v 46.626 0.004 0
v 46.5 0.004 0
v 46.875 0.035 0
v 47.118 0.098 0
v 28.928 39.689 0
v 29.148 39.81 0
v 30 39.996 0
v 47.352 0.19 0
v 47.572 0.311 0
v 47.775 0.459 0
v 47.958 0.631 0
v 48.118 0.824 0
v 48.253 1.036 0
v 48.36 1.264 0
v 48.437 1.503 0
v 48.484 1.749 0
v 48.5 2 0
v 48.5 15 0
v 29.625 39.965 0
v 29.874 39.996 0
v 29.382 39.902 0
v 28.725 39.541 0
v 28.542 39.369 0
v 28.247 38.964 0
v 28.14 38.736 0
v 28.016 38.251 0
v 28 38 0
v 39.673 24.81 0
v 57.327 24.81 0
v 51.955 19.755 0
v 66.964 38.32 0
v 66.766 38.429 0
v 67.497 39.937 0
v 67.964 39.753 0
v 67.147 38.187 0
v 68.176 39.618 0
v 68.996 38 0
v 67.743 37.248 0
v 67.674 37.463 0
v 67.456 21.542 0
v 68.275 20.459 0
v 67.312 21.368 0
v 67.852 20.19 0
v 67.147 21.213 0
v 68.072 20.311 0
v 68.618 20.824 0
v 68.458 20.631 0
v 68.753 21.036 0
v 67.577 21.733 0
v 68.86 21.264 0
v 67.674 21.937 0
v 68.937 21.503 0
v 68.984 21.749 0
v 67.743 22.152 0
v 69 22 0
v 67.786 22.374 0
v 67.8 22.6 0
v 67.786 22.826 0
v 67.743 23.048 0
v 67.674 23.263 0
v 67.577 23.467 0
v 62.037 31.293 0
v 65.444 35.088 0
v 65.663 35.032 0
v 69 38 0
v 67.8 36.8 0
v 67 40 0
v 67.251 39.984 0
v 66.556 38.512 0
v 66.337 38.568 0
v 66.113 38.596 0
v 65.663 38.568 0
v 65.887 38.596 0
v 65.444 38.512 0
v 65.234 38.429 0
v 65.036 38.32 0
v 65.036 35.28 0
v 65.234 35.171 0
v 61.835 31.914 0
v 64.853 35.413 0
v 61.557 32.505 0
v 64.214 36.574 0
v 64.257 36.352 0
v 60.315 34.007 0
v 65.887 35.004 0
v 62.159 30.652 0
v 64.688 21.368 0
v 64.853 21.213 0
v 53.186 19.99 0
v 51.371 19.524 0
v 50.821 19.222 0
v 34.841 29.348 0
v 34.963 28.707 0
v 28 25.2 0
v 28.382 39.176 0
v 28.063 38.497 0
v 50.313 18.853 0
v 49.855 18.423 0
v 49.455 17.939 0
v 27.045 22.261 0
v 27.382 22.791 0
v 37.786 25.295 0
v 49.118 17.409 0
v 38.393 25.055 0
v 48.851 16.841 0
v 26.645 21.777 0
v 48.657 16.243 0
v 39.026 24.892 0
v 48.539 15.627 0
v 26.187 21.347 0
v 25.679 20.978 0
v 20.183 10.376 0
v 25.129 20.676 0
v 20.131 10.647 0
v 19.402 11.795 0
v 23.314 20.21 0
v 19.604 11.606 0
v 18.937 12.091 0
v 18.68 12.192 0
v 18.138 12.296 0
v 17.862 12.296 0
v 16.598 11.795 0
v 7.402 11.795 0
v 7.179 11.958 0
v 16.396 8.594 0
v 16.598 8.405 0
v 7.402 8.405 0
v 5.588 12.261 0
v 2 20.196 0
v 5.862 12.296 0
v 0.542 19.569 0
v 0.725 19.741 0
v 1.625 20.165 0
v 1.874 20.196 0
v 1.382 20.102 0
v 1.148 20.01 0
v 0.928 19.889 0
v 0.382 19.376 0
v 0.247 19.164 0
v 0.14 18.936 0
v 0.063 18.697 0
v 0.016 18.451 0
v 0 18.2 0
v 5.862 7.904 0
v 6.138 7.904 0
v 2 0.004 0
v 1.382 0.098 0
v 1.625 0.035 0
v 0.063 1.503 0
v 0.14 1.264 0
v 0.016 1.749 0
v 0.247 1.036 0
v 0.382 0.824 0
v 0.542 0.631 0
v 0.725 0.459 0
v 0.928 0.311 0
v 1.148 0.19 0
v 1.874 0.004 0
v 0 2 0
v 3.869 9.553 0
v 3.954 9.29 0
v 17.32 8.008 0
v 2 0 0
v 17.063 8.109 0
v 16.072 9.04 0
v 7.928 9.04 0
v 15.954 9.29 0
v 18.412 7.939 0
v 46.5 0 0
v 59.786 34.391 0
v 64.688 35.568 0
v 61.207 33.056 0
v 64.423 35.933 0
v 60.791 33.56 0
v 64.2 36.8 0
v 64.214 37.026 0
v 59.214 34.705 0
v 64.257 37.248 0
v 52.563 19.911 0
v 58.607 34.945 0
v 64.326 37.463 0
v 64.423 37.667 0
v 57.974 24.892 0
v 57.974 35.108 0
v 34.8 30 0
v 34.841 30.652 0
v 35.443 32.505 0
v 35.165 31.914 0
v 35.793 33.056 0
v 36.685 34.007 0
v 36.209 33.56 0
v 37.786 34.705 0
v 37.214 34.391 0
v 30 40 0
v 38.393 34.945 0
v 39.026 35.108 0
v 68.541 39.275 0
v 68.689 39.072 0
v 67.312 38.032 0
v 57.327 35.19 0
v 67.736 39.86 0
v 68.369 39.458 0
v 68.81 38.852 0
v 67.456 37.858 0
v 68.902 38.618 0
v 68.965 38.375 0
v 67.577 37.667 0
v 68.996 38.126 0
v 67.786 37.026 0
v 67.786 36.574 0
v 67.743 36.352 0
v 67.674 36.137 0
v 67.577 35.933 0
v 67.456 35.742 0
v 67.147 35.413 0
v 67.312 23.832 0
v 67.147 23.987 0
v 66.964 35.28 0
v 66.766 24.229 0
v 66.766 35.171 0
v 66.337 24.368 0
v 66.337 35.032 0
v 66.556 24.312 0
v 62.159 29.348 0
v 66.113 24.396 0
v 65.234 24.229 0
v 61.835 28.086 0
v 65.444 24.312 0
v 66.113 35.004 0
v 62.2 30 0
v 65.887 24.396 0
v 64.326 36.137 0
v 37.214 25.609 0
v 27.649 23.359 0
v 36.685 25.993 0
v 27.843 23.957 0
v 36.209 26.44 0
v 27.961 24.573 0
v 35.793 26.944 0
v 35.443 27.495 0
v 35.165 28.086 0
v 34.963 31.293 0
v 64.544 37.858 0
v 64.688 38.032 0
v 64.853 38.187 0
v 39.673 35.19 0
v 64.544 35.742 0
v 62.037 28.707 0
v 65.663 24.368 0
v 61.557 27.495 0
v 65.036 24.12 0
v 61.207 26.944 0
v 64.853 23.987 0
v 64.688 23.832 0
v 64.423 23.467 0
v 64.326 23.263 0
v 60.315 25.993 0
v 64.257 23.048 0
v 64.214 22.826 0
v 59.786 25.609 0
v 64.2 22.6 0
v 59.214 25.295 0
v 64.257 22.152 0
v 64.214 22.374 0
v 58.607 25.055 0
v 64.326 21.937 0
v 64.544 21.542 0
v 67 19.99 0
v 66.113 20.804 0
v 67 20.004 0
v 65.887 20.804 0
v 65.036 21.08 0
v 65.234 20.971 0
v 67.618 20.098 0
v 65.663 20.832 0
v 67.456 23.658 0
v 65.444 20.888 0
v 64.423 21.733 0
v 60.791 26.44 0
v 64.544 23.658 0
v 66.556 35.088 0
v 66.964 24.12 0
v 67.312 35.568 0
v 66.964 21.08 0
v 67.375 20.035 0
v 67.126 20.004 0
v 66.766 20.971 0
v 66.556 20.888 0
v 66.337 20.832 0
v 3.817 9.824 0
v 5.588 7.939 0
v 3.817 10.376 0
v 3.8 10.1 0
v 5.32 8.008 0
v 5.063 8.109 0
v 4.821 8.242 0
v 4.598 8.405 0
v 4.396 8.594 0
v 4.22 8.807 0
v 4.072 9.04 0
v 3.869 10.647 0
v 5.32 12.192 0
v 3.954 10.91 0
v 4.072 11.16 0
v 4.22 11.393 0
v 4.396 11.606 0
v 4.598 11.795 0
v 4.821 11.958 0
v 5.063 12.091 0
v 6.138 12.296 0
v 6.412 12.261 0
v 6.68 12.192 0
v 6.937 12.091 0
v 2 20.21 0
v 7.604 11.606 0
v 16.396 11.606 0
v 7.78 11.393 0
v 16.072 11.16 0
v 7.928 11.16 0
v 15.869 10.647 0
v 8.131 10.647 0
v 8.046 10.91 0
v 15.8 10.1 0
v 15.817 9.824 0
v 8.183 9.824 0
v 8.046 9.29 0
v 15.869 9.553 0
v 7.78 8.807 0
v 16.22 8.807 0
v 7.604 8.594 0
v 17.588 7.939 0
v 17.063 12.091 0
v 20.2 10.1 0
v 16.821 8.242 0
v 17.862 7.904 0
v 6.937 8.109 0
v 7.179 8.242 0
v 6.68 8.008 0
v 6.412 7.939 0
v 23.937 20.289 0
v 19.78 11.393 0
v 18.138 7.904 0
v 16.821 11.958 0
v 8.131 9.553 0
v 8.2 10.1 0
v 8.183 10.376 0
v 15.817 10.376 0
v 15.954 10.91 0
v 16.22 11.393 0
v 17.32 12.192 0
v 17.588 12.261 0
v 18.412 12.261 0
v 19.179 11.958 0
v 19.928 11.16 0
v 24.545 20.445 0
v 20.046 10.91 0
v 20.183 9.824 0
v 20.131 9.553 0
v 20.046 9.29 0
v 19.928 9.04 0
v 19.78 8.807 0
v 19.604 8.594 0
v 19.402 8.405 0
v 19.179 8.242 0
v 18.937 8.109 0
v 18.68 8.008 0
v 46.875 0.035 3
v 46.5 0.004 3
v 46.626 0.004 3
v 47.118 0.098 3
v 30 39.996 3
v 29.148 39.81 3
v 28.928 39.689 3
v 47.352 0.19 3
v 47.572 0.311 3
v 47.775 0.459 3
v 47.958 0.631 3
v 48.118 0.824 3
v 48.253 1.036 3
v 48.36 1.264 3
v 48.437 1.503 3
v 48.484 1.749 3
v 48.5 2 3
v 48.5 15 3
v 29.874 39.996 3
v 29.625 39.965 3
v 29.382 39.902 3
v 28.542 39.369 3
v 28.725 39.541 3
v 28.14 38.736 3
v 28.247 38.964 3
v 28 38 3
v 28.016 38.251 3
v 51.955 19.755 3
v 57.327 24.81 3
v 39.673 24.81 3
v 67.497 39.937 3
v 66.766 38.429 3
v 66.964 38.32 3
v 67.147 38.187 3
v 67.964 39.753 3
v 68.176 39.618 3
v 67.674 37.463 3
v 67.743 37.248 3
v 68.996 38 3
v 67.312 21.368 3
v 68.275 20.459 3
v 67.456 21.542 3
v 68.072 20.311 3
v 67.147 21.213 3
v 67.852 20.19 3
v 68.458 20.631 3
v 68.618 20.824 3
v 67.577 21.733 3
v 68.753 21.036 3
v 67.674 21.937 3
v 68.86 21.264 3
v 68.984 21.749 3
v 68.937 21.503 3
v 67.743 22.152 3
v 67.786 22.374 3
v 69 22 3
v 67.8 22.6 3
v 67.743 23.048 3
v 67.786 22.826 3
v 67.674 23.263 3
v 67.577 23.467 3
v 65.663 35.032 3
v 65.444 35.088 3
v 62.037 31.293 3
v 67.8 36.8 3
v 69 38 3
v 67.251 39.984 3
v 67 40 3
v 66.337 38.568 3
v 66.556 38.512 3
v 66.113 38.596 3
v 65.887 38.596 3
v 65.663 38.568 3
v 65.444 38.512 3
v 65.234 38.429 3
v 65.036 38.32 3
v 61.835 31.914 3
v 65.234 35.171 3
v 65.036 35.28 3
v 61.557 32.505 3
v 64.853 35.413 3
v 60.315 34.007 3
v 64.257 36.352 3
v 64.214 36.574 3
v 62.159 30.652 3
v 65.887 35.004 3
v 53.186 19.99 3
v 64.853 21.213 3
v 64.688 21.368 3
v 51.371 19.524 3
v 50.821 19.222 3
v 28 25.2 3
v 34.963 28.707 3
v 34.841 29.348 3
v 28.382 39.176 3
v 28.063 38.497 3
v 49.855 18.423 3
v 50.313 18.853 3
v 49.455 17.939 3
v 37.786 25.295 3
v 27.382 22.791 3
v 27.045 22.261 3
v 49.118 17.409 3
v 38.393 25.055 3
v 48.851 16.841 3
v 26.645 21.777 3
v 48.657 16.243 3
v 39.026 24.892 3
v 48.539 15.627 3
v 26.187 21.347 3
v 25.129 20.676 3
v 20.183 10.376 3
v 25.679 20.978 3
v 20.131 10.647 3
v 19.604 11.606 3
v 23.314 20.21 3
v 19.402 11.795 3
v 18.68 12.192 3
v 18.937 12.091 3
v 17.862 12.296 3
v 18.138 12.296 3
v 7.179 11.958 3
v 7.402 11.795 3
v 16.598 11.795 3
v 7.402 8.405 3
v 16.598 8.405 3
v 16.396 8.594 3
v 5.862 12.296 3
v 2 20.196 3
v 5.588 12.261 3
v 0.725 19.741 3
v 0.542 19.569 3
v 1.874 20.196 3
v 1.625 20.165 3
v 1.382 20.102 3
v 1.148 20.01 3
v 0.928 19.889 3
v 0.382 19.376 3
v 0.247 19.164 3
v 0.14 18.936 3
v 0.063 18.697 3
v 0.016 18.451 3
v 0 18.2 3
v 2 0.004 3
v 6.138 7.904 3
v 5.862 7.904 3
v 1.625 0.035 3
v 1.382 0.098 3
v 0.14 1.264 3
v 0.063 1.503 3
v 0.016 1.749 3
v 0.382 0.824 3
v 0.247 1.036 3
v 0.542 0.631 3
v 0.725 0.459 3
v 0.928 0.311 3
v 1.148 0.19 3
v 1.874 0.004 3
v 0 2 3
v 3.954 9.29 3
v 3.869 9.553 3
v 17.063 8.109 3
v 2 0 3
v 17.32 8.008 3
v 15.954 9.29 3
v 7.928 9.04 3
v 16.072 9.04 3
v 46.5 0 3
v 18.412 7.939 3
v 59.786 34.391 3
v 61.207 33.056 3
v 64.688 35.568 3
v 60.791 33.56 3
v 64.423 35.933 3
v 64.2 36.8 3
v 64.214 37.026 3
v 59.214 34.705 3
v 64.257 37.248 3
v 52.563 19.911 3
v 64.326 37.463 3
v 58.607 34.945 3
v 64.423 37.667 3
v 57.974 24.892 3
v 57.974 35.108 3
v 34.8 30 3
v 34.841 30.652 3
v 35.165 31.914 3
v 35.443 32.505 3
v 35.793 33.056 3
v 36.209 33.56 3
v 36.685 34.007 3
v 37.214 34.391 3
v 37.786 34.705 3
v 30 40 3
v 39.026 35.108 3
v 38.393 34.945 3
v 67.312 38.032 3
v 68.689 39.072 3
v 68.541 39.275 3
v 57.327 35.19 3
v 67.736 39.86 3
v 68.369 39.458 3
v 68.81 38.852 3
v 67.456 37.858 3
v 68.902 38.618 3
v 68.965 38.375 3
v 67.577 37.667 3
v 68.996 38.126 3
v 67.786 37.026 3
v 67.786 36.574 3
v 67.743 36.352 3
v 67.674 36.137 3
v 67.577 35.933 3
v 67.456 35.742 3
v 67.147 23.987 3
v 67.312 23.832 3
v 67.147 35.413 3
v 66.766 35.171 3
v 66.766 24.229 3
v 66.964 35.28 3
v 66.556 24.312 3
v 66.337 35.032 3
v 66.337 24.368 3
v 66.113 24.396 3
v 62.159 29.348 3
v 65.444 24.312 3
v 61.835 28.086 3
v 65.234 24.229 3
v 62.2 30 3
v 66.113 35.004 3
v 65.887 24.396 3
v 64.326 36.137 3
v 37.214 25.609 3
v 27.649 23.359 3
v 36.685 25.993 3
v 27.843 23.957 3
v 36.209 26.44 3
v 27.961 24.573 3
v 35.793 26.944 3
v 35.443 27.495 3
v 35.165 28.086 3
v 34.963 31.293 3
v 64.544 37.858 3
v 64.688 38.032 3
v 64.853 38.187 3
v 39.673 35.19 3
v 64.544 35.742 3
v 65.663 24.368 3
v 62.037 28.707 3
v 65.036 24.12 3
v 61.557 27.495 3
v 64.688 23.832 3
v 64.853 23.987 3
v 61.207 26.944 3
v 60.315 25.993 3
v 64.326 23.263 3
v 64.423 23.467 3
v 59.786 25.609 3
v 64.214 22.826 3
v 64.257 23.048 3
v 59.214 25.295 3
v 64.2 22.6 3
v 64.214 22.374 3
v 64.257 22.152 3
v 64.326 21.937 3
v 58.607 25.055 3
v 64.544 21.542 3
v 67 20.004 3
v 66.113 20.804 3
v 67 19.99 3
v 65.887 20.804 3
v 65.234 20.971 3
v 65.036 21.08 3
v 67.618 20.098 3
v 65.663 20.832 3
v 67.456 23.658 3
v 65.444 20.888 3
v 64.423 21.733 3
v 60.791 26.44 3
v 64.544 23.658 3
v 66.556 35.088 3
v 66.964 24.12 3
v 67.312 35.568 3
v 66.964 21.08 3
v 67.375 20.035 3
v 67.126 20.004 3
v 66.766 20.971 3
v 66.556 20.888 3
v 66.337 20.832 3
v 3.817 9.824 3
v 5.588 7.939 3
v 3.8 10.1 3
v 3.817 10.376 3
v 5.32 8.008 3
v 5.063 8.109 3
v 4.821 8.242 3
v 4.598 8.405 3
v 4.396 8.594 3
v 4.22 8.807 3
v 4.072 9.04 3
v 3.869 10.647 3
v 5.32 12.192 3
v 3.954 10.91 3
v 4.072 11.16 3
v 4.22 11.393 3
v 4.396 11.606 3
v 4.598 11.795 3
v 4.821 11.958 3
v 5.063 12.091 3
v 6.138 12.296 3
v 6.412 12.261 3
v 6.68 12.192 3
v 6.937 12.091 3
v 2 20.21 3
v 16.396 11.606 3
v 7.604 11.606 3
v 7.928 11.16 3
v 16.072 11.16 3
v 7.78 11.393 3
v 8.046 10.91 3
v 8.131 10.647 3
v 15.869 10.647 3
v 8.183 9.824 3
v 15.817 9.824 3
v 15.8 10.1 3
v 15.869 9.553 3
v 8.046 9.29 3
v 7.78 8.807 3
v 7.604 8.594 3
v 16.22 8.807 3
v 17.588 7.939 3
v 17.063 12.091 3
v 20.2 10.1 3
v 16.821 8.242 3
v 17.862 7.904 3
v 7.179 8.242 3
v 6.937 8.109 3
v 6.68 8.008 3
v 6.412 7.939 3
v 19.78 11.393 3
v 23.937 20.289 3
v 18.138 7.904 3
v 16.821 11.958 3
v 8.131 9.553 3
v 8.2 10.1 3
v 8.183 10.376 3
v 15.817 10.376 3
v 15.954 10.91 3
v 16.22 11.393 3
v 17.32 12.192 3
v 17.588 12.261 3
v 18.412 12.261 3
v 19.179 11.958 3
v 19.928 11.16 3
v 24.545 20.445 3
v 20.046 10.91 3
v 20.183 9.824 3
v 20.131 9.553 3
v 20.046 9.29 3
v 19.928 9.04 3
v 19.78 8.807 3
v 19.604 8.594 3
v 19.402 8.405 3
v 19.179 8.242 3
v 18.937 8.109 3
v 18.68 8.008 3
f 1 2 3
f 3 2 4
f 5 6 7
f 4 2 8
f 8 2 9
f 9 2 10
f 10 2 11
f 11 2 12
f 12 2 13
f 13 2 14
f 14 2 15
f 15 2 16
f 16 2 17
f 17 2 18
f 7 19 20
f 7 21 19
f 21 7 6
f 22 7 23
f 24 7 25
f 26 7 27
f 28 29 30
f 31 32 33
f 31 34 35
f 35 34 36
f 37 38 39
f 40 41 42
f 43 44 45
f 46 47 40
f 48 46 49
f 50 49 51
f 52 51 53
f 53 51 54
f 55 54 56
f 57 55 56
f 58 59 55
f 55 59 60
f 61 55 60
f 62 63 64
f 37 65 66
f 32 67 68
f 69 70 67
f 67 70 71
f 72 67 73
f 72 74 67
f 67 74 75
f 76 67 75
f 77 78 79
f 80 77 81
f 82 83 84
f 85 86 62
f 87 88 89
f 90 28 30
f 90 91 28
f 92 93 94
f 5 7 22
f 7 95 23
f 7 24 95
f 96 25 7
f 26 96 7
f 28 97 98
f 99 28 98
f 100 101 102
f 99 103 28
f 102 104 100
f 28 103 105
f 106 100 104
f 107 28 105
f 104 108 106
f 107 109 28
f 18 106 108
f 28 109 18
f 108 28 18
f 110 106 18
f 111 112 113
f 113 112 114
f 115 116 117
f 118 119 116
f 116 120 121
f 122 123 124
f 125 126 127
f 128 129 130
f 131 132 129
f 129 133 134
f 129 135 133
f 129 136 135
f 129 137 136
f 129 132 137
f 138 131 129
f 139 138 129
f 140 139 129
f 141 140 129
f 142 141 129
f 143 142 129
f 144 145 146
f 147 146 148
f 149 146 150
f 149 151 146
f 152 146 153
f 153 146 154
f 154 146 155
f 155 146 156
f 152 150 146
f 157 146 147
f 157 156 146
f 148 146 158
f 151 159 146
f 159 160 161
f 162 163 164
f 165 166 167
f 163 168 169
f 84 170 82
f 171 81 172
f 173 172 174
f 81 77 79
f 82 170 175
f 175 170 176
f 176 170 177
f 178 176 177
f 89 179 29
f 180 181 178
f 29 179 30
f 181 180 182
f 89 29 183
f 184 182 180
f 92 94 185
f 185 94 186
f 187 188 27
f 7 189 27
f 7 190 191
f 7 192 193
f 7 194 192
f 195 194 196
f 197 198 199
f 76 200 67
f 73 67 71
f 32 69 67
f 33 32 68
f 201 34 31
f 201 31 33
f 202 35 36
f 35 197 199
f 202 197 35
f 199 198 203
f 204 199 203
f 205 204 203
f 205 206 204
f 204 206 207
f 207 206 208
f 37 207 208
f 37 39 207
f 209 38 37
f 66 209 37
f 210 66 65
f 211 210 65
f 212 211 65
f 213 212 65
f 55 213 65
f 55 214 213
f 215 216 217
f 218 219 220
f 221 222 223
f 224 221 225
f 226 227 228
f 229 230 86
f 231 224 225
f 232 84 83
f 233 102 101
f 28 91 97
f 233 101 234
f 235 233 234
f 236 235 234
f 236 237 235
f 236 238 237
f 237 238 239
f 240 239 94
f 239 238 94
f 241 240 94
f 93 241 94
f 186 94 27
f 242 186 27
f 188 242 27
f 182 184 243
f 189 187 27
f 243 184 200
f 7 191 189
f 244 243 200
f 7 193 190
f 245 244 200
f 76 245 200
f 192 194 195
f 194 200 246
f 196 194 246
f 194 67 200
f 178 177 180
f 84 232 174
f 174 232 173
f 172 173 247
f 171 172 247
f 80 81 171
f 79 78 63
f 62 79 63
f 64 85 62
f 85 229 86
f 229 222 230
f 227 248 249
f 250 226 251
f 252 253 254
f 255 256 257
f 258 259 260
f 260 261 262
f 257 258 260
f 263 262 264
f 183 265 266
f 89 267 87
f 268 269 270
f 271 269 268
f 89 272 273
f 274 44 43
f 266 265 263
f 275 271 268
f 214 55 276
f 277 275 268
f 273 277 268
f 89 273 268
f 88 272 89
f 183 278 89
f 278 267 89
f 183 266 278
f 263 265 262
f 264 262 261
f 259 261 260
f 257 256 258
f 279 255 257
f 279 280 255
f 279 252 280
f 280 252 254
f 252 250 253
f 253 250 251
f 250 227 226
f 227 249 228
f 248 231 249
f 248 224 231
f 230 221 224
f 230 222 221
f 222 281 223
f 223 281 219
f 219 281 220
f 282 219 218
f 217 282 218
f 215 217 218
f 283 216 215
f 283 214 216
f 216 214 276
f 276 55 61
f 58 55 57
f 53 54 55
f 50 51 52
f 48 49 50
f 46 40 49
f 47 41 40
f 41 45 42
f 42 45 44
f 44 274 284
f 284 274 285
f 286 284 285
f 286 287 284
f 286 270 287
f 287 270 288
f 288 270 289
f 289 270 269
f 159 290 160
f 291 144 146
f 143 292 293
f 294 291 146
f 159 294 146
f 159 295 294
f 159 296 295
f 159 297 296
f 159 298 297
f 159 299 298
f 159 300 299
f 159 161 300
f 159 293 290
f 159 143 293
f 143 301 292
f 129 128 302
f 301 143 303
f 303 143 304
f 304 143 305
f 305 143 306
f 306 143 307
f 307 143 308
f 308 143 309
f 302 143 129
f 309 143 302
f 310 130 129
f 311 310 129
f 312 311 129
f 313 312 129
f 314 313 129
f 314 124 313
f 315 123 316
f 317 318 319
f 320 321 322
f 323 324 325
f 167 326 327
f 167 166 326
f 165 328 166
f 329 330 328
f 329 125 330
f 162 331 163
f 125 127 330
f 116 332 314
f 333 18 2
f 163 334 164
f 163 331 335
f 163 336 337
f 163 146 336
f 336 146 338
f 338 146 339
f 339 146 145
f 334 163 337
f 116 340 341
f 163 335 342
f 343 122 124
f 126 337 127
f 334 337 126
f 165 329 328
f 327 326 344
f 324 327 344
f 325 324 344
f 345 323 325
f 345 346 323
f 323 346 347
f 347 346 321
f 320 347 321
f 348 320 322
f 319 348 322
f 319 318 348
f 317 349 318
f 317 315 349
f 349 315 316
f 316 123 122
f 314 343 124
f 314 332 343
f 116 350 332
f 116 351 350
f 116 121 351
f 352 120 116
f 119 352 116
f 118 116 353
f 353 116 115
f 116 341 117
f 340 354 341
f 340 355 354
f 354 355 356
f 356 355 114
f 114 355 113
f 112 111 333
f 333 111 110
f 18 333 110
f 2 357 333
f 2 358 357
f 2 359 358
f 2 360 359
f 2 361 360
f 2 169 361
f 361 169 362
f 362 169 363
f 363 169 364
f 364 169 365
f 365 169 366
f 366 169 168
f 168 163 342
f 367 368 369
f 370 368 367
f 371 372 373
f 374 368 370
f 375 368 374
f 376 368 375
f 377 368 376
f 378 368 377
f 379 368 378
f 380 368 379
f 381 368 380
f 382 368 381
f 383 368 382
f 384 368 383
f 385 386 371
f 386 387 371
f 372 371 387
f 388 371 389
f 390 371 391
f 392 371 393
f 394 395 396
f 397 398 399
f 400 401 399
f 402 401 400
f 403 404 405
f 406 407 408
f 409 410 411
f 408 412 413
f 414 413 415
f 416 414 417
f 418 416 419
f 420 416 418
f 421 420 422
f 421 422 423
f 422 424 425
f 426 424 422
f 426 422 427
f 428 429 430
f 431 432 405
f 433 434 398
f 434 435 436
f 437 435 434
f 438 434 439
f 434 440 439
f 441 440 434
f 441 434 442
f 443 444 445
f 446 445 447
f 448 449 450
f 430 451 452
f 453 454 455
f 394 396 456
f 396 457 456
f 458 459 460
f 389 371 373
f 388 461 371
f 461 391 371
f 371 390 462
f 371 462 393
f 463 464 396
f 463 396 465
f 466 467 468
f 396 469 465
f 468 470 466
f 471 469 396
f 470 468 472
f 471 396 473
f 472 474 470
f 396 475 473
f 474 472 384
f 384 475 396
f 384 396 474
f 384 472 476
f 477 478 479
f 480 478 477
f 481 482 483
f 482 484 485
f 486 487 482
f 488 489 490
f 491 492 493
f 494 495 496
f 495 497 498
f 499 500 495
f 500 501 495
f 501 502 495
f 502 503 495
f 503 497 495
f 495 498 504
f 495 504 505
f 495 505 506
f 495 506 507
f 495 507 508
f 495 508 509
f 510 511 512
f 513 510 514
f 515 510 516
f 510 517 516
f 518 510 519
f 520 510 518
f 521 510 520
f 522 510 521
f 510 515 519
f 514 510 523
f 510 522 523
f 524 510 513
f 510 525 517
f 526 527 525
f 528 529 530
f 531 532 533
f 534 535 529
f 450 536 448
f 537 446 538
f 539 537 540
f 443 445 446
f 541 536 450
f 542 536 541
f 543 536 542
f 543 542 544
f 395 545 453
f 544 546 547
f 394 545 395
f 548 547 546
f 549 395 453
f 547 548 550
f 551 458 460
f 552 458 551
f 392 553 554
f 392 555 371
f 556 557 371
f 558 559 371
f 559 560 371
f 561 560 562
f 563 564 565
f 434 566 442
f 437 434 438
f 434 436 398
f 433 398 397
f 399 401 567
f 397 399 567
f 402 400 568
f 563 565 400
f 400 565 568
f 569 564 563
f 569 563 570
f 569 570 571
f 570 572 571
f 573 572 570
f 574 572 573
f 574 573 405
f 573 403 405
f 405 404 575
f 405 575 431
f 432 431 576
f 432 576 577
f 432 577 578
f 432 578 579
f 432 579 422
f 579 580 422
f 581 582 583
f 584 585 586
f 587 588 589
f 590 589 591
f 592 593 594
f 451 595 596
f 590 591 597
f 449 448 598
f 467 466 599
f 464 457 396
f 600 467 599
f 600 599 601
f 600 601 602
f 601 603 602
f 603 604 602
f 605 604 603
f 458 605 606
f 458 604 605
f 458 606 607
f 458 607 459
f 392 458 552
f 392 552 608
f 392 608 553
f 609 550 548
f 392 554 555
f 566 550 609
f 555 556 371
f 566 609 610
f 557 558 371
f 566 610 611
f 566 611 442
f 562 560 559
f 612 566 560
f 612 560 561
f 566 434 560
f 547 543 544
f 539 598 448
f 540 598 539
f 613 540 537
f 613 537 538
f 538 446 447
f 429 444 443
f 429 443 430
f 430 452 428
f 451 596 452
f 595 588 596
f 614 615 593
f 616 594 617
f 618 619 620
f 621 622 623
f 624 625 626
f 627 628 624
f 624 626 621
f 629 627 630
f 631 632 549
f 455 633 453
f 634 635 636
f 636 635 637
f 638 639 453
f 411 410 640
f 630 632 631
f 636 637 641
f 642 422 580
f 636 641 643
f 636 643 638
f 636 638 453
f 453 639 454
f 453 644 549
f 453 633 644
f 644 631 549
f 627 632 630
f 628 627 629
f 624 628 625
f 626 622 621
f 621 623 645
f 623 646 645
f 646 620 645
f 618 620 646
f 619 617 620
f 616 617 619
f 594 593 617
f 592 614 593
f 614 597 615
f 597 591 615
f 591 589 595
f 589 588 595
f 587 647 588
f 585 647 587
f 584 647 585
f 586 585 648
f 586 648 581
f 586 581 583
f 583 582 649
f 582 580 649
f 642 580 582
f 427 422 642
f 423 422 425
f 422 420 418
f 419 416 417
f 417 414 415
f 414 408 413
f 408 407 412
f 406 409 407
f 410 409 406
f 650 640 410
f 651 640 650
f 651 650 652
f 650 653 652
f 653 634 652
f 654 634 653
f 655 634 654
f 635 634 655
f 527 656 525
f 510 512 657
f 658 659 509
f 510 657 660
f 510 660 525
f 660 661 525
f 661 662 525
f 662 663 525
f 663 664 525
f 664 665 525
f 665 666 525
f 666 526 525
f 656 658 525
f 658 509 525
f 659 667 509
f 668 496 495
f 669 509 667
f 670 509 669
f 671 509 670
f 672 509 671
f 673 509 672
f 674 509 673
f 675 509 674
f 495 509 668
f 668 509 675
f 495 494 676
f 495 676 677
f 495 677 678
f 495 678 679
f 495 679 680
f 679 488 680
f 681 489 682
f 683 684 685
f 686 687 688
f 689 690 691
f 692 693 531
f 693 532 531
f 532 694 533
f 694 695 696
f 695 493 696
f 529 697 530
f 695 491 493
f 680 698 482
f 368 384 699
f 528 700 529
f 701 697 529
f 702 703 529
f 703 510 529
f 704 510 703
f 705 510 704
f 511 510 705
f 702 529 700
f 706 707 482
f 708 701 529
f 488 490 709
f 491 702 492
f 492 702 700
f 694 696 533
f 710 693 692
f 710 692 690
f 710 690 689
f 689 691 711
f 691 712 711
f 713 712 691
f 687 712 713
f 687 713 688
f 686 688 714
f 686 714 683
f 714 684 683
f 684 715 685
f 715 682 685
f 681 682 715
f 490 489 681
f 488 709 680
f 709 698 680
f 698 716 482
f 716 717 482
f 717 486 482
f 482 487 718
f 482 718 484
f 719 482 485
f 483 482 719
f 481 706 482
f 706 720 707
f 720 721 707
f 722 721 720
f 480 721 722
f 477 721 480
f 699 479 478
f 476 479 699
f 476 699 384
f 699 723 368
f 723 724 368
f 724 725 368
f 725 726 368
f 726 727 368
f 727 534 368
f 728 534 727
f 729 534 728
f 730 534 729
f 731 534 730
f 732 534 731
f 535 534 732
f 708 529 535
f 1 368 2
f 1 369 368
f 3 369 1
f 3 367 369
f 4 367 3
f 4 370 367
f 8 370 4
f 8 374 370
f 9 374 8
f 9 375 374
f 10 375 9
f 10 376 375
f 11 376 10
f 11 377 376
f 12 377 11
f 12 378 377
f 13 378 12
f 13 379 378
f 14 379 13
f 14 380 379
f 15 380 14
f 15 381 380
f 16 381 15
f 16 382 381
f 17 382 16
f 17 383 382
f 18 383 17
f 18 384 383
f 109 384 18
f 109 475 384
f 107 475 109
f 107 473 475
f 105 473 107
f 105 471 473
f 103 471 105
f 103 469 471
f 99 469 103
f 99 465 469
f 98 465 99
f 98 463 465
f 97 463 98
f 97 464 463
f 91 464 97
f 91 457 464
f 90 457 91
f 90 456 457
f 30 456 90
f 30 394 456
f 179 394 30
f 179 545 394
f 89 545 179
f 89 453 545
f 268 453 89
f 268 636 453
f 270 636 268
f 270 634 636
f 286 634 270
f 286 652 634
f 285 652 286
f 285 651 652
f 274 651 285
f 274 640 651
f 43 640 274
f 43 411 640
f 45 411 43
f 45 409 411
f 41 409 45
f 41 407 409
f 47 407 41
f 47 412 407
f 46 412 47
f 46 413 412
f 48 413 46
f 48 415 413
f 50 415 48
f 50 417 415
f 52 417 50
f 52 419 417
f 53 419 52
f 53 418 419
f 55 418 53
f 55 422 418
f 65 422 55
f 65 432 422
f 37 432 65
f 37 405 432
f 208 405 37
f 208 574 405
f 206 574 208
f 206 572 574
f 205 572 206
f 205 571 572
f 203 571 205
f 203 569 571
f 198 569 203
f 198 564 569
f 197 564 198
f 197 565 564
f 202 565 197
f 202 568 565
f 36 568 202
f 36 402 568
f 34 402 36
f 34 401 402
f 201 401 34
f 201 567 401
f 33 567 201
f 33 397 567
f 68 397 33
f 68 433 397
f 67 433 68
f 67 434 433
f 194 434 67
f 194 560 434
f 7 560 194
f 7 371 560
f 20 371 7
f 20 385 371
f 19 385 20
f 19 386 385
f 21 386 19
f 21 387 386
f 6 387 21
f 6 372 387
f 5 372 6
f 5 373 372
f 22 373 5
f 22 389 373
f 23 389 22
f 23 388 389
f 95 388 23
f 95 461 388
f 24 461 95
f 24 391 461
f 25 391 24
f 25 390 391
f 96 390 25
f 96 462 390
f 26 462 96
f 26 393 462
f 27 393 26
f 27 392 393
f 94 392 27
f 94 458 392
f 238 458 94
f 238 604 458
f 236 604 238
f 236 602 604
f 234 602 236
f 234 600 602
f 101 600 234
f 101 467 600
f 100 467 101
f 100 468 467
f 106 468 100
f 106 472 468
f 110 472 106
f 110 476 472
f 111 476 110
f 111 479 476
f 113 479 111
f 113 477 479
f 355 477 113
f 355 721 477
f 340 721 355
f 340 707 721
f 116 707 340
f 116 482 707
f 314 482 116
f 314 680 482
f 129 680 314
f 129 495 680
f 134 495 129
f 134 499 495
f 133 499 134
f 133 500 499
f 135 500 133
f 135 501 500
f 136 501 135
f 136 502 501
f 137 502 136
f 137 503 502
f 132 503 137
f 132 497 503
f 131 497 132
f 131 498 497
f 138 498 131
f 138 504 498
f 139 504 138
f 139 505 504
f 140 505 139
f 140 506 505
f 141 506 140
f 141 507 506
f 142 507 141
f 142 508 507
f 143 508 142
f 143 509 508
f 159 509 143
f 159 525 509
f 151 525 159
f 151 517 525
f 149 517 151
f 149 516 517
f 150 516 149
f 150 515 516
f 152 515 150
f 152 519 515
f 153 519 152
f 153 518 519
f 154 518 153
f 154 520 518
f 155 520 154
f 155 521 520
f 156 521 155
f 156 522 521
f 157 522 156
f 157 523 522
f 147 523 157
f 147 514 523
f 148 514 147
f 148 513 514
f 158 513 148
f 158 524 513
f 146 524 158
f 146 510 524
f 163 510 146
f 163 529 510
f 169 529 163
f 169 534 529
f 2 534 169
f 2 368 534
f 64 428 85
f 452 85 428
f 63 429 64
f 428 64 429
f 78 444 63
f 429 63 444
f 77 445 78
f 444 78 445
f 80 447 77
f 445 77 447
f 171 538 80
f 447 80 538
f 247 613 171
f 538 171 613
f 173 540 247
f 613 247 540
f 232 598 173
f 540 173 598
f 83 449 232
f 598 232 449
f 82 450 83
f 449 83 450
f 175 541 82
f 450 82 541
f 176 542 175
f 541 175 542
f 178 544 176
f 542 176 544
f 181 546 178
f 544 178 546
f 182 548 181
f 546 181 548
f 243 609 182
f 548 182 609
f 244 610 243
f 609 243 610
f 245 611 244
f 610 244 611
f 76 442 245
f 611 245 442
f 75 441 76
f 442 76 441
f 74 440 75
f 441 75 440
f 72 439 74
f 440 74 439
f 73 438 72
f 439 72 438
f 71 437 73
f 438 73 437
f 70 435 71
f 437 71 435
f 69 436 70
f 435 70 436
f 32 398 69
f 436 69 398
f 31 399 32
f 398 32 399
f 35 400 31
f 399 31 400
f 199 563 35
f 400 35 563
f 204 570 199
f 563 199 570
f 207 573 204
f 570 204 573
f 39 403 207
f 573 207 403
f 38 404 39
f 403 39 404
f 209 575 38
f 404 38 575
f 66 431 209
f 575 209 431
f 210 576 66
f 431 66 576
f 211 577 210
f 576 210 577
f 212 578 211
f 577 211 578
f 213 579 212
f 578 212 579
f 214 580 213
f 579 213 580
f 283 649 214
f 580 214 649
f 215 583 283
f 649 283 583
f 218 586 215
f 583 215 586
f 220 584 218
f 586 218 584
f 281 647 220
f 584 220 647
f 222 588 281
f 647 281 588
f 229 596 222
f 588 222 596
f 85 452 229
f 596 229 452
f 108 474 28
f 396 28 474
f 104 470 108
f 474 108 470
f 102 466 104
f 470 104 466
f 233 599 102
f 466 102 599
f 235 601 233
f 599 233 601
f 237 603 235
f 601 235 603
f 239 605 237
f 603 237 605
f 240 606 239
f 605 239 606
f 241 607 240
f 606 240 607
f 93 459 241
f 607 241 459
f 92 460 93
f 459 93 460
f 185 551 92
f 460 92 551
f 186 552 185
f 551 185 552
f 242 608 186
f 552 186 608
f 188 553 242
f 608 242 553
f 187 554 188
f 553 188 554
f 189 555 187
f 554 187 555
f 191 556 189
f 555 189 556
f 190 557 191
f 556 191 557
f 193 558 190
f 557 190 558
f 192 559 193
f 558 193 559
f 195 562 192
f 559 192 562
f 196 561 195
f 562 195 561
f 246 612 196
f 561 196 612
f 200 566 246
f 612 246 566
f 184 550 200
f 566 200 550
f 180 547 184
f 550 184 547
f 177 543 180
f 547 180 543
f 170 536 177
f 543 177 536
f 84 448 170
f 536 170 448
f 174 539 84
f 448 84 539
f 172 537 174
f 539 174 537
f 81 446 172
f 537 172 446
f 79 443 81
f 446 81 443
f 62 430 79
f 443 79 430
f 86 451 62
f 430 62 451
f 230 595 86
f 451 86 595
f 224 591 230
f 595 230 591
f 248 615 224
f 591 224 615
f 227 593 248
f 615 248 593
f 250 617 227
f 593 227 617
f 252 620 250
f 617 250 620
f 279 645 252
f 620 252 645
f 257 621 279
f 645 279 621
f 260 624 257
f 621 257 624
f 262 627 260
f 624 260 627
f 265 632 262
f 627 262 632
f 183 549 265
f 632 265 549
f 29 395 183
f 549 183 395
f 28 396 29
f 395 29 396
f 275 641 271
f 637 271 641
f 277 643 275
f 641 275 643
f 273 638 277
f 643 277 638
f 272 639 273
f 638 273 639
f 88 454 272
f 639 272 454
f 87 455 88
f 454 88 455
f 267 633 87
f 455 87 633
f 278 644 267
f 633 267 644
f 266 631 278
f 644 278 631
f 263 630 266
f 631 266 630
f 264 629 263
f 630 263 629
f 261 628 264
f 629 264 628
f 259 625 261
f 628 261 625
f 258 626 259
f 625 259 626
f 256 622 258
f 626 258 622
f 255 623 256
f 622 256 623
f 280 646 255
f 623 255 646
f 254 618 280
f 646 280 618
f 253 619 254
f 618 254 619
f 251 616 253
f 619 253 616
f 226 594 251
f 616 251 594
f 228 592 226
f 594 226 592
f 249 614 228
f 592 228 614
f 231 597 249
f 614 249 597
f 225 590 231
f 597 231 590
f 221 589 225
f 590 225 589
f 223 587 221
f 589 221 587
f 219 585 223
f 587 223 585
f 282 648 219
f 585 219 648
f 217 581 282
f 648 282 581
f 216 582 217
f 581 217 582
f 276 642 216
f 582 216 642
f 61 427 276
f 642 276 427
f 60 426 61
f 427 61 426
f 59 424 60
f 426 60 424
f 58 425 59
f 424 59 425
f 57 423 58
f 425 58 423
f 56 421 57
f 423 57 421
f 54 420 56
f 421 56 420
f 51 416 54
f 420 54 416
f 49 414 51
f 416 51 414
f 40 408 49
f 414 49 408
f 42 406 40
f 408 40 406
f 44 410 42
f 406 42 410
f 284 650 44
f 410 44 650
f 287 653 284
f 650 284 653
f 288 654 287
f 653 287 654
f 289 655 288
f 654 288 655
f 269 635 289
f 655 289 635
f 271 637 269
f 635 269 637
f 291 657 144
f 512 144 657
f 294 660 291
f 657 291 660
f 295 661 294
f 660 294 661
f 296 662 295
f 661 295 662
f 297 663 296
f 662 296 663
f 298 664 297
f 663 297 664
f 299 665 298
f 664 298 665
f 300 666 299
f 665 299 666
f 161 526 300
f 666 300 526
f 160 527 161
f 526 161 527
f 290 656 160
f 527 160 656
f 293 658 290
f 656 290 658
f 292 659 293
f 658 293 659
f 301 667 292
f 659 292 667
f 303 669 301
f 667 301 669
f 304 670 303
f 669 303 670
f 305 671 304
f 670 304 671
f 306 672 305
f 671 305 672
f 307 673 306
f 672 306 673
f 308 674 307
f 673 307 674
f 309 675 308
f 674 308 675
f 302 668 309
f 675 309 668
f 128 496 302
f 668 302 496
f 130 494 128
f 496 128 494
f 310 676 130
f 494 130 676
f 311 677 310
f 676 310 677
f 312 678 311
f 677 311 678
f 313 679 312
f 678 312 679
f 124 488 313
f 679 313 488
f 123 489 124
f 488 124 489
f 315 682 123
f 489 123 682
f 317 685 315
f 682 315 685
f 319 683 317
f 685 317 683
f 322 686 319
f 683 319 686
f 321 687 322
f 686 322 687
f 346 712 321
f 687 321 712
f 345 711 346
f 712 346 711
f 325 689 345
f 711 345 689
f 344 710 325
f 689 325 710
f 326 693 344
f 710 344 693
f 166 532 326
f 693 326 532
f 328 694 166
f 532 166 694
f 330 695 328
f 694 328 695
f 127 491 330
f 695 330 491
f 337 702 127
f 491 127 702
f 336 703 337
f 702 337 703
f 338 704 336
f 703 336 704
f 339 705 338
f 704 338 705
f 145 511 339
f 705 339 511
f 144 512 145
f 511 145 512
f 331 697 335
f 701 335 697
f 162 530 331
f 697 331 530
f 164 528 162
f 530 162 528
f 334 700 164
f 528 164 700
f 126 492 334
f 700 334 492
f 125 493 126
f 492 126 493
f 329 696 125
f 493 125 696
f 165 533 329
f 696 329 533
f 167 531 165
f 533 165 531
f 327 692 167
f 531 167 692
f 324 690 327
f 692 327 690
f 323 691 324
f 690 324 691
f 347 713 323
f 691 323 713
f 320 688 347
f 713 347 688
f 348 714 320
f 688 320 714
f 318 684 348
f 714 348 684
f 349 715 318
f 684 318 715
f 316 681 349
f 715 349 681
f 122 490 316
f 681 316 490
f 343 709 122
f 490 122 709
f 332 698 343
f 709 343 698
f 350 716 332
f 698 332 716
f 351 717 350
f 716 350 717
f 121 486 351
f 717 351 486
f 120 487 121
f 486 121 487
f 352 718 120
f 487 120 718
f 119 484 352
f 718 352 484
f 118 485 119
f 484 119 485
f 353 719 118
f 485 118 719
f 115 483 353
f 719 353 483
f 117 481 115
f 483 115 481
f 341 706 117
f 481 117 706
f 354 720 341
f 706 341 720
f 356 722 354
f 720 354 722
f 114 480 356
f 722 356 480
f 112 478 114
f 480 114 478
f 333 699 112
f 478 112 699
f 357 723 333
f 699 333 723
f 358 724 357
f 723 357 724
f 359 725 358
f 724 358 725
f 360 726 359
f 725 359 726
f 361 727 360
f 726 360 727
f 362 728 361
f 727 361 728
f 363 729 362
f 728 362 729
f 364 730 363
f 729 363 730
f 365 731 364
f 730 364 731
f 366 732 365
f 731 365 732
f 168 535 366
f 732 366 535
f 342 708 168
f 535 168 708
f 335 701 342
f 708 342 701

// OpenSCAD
$fn = 50;

width = 69;
height = 40;

module round_corner(r) difference() {
  translate([-0.1, -0.1]) square([r + 0.1, r + 0.1]);
  translate([r, r]) circle(r);
}

linear_extrude(height = 3) difference() {
  square([width, height]);

  // screw holes
  translate([6, 10.1]) circle(r = 2.2);
  translate([18, 10.1]) circle(r = 2.2);

  translate([width - 3, height - 1.8 - 1.4]) circle(r = 1.8);
  translate([width - 3, height - 1.8 * 2 - 1.4 * 2 - 11]) circle(r = 1.8);

  // stadium hole
  hull() {
    from_left = 12;
    from_top = 10;
    from_center_to_center = 17;

    translate([width - from_left, height - from_top]) circle(r = 5.2);
    translate([width - from_left - from_center_to_center, height - from_top]) circle(r = 5.2);
  }

  // remove bottom-right section
  hull() {
    translate([48.5 + 5, height - 25]) circle(r = 5);
    translate([width, height - 25]) circle(r = 5);
    translate([48.5 + 5, 0]) circle(r = 5);
    translate([width, 0]) circle(r = 5);
  }

  // remove top-left section
  hull() {
    translate([0, 20.2 + 5]) circle(r = 5);
    translate([28 - 5, 20.2 + 5]) circle(r = 5);
    translate([28 - 5, height]) circle(r = 5);
    translate([0, height]) circle(r = 5);
  }

  // round all remaining corners
  round_corner(2);
  translate([48.5, 0]) mirror([1, 0]) round_corner(2);
  translate([width, height - 20]) mirror([1, 0]) round_corner(2);
  translate([width, height]) mirror([1, 1]) round_corner(2);
  translate([0,  20.2]) mirror([0, 1]) round_corner(2);
  translate([28,  height]) mirror([0, 1]) round_corner(2);
}
